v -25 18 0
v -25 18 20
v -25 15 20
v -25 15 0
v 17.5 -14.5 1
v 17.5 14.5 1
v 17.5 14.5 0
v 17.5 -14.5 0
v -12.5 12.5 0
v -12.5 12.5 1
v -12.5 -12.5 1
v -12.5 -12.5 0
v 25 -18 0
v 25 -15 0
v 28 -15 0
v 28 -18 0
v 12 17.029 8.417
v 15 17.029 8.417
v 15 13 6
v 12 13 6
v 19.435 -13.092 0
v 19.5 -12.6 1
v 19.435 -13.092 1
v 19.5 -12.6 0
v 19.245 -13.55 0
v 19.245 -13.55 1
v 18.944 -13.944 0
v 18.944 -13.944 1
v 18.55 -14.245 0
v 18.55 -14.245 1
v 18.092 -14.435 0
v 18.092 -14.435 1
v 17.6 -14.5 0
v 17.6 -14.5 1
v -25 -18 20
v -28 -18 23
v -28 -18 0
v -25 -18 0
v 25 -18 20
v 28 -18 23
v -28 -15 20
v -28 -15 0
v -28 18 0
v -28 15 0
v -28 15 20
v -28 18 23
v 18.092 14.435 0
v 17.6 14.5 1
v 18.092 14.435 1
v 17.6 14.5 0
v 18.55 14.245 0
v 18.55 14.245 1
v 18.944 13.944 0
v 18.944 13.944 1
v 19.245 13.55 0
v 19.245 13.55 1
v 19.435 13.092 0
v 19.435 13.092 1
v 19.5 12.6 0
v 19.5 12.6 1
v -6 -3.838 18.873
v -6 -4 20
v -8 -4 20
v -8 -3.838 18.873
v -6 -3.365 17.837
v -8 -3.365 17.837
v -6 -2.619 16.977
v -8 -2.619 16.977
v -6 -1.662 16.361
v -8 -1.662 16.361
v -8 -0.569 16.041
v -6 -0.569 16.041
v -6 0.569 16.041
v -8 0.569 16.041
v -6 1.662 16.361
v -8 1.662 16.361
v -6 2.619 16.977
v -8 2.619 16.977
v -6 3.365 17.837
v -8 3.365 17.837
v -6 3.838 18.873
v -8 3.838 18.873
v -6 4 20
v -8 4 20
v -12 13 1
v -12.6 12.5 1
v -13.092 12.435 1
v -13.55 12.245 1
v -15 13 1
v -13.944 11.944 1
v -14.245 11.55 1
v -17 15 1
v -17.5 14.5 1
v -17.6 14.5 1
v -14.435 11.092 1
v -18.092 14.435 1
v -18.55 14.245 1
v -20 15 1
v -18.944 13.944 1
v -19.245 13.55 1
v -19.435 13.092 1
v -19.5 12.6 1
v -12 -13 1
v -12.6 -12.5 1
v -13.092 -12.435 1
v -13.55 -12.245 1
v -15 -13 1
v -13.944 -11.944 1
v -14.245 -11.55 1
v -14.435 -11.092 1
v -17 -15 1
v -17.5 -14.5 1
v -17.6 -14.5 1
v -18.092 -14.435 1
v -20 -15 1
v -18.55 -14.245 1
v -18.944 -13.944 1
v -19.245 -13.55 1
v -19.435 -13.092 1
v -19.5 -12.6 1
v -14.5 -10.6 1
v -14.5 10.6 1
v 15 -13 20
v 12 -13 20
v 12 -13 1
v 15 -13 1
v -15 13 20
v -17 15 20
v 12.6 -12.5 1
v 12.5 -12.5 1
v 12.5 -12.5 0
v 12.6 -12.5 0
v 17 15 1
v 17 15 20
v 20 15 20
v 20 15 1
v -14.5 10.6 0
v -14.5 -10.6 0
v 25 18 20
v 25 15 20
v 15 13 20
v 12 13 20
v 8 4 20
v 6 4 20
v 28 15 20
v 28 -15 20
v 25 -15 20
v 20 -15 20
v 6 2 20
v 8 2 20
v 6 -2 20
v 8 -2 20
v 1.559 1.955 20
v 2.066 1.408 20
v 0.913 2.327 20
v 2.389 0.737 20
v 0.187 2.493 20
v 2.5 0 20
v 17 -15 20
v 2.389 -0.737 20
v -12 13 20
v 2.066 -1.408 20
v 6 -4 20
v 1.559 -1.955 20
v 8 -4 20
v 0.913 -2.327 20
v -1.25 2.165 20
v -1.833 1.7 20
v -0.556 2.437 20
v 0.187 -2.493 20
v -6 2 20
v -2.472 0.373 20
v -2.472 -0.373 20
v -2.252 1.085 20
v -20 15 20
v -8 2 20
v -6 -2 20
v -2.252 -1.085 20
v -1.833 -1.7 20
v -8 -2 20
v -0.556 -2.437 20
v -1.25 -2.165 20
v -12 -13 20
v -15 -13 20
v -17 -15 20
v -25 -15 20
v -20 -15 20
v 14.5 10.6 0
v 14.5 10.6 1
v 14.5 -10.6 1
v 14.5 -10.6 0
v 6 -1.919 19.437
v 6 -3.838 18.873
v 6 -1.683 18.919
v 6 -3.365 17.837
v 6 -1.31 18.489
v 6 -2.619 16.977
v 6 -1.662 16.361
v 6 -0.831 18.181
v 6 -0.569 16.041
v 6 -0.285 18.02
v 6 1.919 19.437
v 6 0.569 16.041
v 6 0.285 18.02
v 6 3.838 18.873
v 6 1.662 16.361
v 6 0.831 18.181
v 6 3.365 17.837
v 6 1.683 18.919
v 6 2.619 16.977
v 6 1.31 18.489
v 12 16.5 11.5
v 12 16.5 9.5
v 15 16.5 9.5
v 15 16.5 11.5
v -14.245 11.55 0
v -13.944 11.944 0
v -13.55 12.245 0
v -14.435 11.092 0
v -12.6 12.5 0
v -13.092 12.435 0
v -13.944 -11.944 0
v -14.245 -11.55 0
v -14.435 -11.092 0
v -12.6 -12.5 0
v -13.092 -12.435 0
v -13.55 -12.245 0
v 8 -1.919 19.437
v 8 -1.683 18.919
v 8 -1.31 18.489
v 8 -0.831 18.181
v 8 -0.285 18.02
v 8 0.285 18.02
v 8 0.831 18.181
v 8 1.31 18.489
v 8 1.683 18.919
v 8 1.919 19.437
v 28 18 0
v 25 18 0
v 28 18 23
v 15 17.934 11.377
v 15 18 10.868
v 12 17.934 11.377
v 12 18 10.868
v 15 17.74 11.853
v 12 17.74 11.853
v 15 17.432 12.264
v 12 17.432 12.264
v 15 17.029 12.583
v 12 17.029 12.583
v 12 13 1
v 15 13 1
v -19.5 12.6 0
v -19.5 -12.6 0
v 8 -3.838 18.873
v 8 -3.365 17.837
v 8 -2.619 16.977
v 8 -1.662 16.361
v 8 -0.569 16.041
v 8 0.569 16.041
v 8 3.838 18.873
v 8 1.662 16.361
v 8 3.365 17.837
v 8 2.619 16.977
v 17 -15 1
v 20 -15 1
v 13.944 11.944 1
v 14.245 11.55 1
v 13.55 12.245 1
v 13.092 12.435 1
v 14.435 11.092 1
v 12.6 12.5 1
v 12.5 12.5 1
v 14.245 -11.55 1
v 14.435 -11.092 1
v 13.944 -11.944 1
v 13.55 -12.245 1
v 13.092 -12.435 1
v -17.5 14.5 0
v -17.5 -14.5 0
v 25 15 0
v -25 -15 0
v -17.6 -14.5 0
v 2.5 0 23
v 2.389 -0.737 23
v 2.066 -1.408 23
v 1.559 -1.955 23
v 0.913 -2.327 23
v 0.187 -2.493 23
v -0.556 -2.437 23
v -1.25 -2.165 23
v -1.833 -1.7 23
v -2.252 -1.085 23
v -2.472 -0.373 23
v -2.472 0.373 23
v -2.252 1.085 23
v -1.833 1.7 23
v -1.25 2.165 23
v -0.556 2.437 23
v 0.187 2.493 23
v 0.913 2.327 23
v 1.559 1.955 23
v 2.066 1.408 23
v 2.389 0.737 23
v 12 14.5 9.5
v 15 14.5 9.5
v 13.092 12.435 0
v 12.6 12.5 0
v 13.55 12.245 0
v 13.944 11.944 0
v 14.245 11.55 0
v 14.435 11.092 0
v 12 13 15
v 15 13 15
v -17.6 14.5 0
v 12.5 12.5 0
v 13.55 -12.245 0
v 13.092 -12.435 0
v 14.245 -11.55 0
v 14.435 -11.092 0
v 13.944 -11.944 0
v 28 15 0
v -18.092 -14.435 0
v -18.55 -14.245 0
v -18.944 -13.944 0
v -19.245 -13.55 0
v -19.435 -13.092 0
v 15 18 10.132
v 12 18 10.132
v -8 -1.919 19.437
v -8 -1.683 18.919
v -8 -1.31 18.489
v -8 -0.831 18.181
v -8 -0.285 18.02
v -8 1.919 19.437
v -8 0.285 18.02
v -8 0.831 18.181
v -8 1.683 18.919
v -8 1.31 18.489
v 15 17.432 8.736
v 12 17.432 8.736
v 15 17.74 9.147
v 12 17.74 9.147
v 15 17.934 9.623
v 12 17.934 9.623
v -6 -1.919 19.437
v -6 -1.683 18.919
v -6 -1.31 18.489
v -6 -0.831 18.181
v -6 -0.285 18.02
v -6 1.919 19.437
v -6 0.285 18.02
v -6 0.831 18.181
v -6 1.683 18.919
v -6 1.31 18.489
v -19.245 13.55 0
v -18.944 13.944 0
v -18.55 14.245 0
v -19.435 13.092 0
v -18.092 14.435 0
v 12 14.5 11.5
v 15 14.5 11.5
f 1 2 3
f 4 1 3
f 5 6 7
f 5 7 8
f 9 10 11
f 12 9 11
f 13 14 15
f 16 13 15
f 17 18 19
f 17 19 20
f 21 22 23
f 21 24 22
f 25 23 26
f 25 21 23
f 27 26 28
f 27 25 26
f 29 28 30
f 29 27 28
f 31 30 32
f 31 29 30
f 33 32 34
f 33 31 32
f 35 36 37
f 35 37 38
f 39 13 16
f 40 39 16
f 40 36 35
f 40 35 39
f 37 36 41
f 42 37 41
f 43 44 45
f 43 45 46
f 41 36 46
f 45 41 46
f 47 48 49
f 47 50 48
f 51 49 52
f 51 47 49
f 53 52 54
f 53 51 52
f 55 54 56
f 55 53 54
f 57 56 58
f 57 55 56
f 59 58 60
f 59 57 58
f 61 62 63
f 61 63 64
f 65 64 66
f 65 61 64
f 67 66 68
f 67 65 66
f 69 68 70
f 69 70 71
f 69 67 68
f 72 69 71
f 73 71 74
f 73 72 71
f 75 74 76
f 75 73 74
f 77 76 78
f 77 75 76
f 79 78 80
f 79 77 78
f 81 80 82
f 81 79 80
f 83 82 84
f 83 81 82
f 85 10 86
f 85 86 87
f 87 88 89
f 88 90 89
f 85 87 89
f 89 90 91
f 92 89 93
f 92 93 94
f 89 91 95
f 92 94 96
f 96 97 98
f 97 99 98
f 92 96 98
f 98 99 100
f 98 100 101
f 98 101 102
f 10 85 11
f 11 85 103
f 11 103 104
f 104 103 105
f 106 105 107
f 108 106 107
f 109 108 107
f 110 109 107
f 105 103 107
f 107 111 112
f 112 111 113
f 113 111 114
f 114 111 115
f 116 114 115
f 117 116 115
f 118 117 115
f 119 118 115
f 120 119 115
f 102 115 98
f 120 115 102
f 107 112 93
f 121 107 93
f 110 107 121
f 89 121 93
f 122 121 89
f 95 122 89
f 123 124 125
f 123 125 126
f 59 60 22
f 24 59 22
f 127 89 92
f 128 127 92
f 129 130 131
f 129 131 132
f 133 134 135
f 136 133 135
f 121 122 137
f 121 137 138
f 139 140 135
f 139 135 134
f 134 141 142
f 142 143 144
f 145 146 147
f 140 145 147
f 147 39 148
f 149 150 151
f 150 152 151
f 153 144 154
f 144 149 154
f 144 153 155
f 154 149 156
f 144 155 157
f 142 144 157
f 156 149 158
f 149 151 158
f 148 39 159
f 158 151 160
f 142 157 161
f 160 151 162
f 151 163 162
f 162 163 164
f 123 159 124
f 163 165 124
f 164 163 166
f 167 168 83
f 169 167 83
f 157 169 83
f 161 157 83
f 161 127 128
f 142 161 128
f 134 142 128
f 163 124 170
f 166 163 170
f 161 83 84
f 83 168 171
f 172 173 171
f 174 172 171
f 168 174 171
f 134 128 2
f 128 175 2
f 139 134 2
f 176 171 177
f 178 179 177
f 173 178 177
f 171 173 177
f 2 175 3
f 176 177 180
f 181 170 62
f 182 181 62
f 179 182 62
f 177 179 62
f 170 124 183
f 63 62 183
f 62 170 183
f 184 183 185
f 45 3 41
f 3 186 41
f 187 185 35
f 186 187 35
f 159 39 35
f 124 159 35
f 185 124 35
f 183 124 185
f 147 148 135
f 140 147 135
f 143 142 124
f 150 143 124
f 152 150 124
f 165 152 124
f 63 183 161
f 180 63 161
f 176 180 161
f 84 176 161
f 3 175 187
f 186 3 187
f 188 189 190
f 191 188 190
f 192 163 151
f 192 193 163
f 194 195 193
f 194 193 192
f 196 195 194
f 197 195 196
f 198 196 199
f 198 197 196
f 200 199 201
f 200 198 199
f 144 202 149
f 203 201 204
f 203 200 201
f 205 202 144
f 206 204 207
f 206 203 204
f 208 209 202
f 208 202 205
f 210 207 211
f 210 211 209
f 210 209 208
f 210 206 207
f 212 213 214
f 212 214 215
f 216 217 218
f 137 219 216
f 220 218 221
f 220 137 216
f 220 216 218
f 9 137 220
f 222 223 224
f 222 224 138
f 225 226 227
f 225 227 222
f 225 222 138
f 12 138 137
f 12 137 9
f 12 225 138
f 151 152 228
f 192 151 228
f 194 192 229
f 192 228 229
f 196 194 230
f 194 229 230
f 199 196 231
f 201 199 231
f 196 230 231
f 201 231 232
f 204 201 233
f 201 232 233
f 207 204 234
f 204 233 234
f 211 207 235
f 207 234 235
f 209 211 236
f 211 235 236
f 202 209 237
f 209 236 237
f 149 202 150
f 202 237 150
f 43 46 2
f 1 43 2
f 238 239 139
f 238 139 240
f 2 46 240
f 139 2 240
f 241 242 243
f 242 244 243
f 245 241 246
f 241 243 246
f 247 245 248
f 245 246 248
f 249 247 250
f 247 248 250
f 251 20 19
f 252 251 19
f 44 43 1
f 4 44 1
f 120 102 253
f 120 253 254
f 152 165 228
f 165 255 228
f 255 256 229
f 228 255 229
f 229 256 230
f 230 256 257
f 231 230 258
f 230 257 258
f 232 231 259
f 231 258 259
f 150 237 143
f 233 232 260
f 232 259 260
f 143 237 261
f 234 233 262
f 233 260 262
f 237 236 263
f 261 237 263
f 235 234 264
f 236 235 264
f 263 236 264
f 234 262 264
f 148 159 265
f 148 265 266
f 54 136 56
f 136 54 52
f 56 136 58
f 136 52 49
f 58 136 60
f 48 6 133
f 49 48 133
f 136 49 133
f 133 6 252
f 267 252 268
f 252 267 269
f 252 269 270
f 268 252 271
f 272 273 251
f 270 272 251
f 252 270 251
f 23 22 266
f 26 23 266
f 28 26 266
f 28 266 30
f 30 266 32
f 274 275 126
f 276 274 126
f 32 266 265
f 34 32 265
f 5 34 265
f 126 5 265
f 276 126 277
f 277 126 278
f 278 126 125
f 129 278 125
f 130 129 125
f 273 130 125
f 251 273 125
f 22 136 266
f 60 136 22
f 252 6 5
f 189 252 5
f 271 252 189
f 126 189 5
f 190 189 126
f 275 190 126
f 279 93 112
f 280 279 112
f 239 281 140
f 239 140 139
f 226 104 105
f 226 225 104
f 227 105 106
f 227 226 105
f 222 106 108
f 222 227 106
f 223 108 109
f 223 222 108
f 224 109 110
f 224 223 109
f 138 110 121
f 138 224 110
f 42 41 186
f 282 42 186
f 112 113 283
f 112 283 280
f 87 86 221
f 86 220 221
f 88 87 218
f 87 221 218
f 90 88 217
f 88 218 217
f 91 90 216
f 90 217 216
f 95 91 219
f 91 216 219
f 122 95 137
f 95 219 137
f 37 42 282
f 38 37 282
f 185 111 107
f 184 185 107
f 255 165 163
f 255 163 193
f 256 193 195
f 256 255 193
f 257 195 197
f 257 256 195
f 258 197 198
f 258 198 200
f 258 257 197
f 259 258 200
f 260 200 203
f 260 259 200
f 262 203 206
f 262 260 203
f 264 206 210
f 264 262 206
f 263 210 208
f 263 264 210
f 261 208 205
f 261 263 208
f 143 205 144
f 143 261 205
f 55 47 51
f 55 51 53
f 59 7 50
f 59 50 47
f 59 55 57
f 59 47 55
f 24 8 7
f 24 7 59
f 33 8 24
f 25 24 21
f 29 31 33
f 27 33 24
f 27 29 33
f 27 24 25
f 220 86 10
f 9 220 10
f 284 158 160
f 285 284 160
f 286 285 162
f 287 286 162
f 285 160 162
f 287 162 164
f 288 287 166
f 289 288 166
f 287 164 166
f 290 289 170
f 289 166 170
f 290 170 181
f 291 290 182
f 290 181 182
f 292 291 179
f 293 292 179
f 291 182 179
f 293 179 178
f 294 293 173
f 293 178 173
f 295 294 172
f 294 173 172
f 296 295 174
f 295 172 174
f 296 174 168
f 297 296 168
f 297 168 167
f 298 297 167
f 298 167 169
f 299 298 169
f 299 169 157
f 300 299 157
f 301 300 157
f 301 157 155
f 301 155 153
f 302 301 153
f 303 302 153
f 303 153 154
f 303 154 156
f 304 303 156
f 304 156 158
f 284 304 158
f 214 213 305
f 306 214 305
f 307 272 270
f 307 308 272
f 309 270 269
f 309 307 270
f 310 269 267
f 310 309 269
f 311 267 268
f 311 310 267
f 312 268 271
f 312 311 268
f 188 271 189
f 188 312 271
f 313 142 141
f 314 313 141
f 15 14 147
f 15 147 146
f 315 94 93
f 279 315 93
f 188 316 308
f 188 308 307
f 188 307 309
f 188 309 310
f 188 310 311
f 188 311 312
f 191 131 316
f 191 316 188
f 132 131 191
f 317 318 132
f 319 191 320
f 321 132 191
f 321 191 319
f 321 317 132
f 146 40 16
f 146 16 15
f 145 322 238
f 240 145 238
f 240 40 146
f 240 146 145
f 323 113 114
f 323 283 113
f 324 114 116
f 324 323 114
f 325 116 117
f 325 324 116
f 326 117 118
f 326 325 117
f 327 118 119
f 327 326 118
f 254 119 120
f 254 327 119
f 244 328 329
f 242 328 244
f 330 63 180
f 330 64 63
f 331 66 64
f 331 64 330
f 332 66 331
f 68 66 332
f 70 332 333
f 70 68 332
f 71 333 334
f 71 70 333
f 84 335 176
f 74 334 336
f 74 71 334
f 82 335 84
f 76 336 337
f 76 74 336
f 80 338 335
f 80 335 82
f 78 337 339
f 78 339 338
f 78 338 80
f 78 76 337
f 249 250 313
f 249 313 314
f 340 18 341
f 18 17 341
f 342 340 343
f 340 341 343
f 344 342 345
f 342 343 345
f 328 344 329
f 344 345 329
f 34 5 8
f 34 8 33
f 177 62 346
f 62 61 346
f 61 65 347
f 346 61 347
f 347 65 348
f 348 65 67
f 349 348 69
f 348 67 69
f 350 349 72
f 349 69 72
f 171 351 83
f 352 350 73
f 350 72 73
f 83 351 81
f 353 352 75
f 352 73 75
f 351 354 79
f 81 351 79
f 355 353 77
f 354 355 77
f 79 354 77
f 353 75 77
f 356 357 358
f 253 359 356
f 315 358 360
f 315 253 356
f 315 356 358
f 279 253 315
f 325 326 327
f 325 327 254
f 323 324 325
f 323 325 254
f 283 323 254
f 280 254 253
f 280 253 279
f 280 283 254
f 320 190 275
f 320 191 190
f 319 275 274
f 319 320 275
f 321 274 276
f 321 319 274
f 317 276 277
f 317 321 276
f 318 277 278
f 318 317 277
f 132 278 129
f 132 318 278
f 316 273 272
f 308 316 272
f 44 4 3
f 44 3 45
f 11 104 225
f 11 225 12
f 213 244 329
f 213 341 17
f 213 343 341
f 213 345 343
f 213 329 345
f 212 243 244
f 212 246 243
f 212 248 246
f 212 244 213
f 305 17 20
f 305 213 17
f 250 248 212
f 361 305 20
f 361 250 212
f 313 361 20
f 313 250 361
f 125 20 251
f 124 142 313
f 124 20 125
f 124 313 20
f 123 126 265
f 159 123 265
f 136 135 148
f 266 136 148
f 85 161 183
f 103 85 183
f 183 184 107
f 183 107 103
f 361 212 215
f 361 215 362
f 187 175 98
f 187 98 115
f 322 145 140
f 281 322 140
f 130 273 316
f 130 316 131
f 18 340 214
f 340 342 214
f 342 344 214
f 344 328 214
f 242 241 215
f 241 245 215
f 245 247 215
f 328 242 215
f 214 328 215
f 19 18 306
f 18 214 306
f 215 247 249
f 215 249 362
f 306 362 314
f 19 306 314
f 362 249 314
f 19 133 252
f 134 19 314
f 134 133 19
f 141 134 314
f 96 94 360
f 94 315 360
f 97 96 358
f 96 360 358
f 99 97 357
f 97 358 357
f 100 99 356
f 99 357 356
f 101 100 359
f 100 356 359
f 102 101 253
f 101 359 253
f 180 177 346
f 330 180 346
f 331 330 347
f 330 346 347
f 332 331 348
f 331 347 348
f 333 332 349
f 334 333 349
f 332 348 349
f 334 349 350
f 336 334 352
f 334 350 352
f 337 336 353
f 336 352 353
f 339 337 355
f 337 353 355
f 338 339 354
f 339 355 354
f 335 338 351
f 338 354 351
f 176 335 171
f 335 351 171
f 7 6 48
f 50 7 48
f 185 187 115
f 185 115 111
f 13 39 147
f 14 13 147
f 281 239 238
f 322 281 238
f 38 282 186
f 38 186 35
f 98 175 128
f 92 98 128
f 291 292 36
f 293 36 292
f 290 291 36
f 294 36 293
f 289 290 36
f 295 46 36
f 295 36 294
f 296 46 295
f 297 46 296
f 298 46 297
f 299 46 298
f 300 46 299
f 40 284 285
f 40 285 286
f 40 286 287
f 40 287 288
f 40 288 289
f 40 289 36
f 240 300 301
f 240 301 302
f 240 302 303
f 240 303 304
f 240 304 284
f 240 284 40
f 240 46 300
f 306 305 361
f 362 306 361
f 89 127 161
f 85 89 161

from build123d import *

# Parameters (mm, degrees)
SKETCH011_W     = 3
SKETCH011_H     = 9
SKETCH012_W     = 3
SKETCH012_H     = 3
SKETCH_W        = 70
SKETCH_H        = 50
PAD_DEPTH       = 30
POCKET_DEPTH    = 20
SKETCH002_W     = 3
SKETCH002_H     = 30
PAD001_DEPTH    = 19
SKETCH003_W     = 3
SKETCH003_H     = 26
PAD002_DEPTH    = 19
SKETCH004_W     = 2
SKETCH004_H     = 29
PAD003_DEPTH    = 1
SKETCH005_W     = 2
SKETCH005_H     = 25
PAD004_DEPTH    = 1
FILLET_R        = 1.9
SKETCH006_R     = 2.5
POCKET001_DEPTH = 12
SKETCH007_W     = 2
SKETCH007_H     = 2
SKETCH009_W     = 80
SKETCH009_H     = 80
SKETCH009_W_2   = 56
SKETCH009_H_2   = 36
POCKET002_DEPTH = 40
SKETCH010_W     = 80
SKETCH010_H     = 80
POCKET003_DEPTH = 7
SKETCH013_W     = 2
SKETCH013_H     = 2
POCKET004_DEPTH = 5
FILLET001_R     = 2
PAD005_DEPTH    = 19


with BuildPart() as loft_body:
    # Sketch011 (on Face42 of Pocket003) → Loft section 0
    with BuildSketch(Plane(origin=(0, 13, 0), x_dir=(-1, 0, 0), z_dir=(0, 1, 0))):
        with Locations((-13.5, 10.5)):
            Rectangle(SKETCH011_W, SKETCH011_H)
    # Sketch012 (on Face36 of Pocket003) → Loft section 1
    with BuildSketch(Plane(origin=(0, 18, 0), x_dir=(-1, 0, 0), z_dir=(0, 1, 0))):
        with Locations((-13.5, 10.5)):
            Rectangle(SKETCH012_W, SKETCH012_H)
    loft()


with BuildPart() as body001:
    # Sketch → Pad (new body)
    with BuildSketch(Plane.XY):
        Rectangle(SKETCH_W, SKETCH_H)
    extrude(amount=PAD_DEPTH)

    # Sketch001 (on Face5 of Pad) → Pocket (cut)
    with BuildSketch(Plane(origin=(0, 0, 0), x_dir=(1, 0, 0), z_dir=(0, 0, -1))):
        Polygon((-35, 15), (-25, 15), (-25, 25), (25, 25), (25, 15), (35, 15), (35, -15), (25, -15), (25, -25), (-25, -25), (-25, -15), (-35, -15), align=None)
    extrude(amount=-POCKET_DEPTH, mode=Mode.SUBTRACT)

    # Sketch002 (on Face4 of Pocket) → Pad001 (join)
    with BuildSketch(Plane(origin=(0, 0, 20), x_dir=(1, 0, 0), z_dir=(0, 0, -1))):
        with Locations((-18.5, 0)):
            Rectangle(SKETCH002_W, SKETCH002_H)
        with Locations((18.5, 0)):
            Rectangle(SKETCH002_W, SKETCH002_H)
    extrude(amount=PAD001_DEPTH)

    # Sketch003 (on Face4 of Pad001) → Pad002 (join)
    with BuildSketch(Plane(origin=(0, 0, 20), x_dir=(1, 0, 0), z_dir=(0, 0, -1))):
        with Locations((13.5, 0)):
            Rectangle(SKETCH003_W, SKETCH003_H)
        with Locations((-13.5, 0)):
            Rectangle(SKETCH003_W, SKETCH003_H)
    extrude(amount=PAD002_DEPTH)

    # Sketch004 (on Face36 of Pad002) → Pad003 (join)
    with BuildSketch(Plane(origin=(0, 0, 1), x_dir=(1, 0, 0), z_dir=(0, 0, -1))):
        with Locations((18.5, 0)):
            Rectangle(SKETCH004_W, SKETCH004_H)
        with Locations((-18.5, 0)):
            Rectangle(SKETCH004_W, SKETCH004_H)
    extrude(amount=PAD003_DEPTH)

    # Sketch005 (on Face37 of Pad003) → Pad004 (join)
    with BuildSketch(Plane(origin=(0, 0, 1), x_dir=(1, 0, 0), z_dir=(0, 0, -1))):
        with Locations((-13.5, 0)):
            Rectangle(SKETCH005_W, SKETCH005_H)
        with Locations((13.5, 0)):
            Rectangle(SKETCH005_W, SKETCH005_H)
    extrude(amount=PAD004_DEPTH)

    # Fillet
    fillet_edges = [body001.edges().sort_by_distance(p)[0] for p in [
        (-19.5, 14.5, 0.5),
        (-14.5, 12.5, 0.5),
        (-19.5, -14.5, 0.5),
        (-14.5, -12.5, 0.5),
        (19.5, 14.5, 0.5),
        (14.5, 12.5, 0.5),
        (14.5, -12.5, 0.5),
        (19.5, -14.5, 0.5),
    ]]
    fillet(fillet_edges, radius=FILLET_R)

    # Sketch006 (on Face13 of Fillet) → Pocket001 (cut)
    with BuildSketch(Plane(origin=(0, 0, 20), x_dir=(1, 0, 0), z_dir=(0, 0, -1))):
        Circle(SKETCH006_R)
    extrude(amount=-POCKET001_DEPTH, mode=Mode.SUBTRACT)

    # Sketch007 (on Face13 of Pocket001) → Revolution (revolve)
    with BuildSketch(Plane(origin=(0, 0, 20), x_dir=(1, 0, 0), z_dir=(0, 0, -1))):
        with Locations((-7, 3)):
            Rectangle(SKETCH007_W, SKETCH007_H)
        with Locations((7, 3)):
            Rectangle(SKETCH007_W, SKETCH007_H)
    revolve(axis=Axis((-10, 0, 20), (1, 0, 0)))

    # Sketch009 (on Face49 of Revolution) → Pocket002 (cut)
    with BuildSketch(Plane.XY.offset(30)):
        Rectangle(SKETCH009_W, SKETCH009_H)
        Rectangle(SKETCH009_W_2, SKETCH009_H_2, mode=Mode.SUBTRACT)
    extrude(amount=-POCKET002_DEPTH, mode=Mode.SUBTRACT)

    # Sketch010 (on Face47 of Pocket002) → Pocket003 (cut)
    with BuildSketch(Plane.XY.offset(30)):
        Rectangle(SKETCH010_W, SKETCH010_H)
    extrude(amount=-POCKET003_DEPTH, mode=Mode.SUBTRACT)

    # Fusion: union Loft body
    add(loft_body.part)

    # Sketch013 (on Face56 of BaseFeature) → Pocket004 (cut)
    with BuildSketch(Plane(origin=(12, 0, 0), x_dir=(0, -1, 0), z_dir=(-1, 0, 0))):
        with Locations((-15.5, 10.5)):
            Rectangle(SKETCH013_W, SKETCH013_H)
    extrude(amount=-POCKET004_DEPTH, mode=Mode.SUBTRACT)

    # Fillet001
    fillet001_edges = [body001.edges().sort_by_distance(p)[0] for p in [
        (13.5, 18, 12),
        (13.5, 18, 9),
    ]]
    fillet(fillet001_edges, radius=FILLET001_R)

    # Sketch014 (on Face16 of Fillet001) → Pad005 (join)
    with BuildSketch(Plane(origin=(0, 0, 20), x_dir=(1, 0, 0), z_dir=(0, 0, -1))):
        Polygon((-17, 15), (-15, 13), (-15, -13), (-17, -15), align=None)
        Polygon((17, -15), (15, -13), (15, 13), (17, 15), align=None)
    extrude(amount=PAD005_DEPTH)


solid = body001.part
